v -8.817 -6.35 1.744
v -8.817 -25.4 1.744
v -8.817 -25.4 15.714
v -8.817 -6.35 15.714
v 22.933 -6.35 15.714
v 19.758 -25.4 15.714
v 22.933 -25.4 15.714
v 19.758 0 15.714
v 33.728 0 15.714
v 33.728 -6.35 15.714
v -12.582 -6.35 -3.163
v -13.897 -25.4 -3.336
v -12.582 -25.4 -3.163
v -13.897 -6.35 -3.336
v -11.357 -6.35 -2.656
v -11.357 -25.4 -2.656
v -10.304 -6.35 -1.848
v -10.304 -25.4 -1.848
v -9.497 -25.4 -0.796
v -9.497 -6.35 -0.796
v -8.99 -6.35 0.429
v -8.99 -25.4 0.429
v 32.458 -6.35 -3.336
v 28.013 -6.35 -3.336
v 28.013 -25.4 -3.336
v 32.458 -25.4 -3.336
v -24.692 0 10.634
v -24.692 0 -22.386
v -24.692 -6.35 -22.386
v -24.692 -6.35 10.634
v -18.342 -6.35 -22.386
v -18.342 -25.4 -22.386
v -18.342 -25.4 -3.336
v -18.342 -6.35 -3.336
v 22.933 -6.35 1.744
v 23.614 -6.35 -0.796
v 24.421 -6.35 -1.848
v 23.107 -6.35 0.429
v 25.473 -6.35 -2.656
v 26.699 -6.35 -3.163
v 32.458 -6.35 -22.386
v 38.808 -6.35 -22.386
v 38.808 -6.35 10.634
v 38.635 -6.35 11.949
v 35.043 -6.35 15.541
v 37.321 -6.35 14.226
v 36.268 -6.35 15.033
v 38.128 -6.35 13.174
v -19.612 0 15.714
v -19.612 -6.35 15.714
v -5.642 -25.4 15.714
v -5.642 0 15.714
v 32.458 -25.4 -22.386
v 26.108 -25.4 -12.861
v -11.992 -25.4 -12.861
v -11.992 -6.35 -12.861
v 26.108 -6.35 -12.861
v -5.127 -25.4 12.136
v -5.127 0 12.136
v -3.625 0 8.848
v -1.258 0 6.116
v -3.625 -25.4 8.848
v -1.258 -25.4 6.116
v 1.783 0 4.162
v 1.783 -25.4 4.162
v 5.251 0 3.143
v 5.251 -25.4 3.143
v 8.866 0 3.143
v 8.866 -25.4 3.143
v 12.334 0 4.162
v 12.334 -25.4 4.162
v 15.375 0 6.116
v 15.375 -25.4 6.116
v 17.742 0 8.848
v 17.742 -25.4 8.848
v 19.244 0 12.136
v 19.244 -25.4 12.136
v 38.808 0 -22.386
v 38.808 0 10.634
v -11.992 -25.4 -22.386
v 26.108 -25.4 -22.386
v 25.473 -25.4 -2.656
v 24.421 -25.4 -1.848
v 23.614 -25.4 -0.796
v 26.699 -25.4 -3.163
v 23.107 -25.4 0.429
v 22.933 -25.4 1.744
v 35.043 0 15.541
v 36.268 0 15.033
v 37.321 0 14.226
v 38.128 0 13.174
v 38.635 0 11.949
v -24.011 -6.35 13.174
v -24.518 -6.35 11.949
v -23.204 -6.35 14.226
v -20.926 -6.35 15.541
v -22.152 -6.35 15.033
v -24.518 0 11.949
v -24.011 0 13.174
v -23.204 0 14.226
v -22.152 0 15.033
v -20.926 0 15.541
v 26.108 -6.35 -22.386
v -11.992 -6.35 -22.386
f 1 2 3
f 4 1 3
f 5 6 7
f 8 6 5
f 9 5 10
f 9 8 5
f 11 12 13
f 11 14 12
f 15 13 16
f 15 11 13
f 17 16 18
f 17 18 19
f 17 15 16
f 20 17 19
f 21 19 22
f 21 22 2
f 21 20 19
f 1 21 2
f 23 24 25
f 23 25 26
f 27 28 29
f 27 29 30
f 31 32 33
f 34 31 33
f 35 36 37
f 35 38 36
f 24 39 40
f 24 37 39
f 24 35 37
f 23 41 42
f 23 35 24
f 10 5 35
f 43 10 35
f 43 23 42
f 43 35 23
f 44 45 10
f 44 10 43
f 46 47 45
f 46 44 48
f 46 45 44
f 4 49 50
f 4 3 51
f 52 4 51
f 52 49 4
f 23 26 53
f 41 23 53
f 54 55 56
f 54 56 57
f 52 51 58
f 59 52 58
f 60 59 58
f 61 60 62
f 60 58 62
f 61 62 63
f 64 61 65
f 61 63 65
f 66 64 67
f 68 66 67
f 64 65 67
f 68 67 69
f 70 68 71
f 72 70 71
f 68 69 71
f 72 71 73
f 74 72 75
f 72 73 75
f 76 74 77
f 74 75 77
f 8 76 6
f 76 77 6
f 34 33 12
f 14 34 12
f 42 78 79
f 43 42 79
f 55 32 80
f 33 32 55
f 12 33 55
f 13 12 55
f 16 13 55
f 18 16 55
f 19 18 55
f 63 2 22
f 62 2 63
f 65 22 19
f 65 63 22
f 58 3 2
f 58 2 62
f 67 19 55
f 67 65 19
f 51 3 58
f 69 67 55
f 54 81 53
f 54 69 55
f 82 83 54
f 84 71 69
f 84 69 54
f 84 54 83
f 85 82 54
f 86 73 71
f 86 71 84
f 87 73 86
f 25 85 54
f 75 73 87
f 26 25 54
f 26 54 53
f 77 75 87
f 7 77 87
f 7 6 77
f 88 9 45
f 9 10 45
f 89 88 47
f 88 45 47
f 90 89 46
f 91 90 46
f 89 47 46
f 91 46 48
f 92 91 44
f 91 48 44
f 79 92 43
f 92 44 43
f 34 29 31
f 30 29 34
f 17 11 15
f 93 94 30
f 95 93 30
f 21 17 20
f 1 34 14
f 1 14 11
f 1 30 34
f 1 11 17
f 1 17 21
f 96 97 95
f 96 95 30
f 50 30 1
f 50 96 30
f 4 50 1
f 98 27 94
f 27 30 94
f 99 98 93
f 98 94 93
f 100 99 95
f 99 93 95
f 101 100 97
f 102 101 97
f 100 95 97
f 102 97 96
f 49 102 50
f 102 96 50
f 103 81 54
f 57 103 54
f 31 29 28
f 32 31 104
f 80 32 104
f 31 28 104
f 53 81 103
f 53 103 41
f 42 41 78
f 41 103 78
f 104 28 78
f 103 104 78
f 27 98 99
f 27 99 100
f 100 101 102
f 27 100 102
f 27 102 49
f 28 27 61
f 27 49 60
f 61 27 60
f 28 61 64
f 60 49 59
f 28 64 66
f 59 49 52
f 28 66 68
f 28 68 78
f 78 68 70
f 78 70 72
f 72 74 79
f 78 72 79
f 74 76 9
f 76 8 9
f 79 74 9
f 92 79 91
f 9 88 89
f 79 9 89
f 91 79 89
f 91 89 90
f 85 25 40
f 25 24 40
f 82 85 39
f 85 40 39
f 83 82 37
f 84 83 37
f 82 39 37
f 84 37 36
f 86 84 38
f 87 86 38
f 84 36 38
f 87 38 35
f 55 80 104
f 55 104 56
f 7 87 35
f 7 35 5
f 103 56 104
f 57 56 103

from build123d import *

# Parameters (mm, degrees)
F0_W     = 63.5
F0_H     = 38.1
F1_DEPTH = 25.4
F2_R     = 12.7
F3_DEPTH = 25.4
F5_DEPTH = 19.05
F6_DEPTH = 19.05
F4_W     = 38.1
F4_H     = 9.525
F7_DEPTH = 19.05
F4_W_2   = 9.525
F4_H_2   = 19.05
F8_DEPTH = 19.05
F9_DEPTH = 19.05
F10_R    = 5.08


with BuildPart() as f1:
    # F0 (on Front) → F1 (new body)
    with BuildSketch(Plane.XZ):
        with Locations((7.05844, -3.336163)):
            Rectangle(F0_W, F0_H)
    extrude(amount=F1_DEPTH)

    # F2 (on face) → F3 (cut)
    with BuildSketch(Plane.XZ.offset(25.4)):
        with Locations((7.05844, 15.713837)):
            Circle(F2_R)
    extrude(amount=-F3_DEPTH, mode=Mode.SUBTRACT)

    # F4 (on face) → F5 (cut)
    with BuildSketch(Plane.XZ.offset(25.4)):
        Polygon((32.45844, -3.336163), (32.45844, -22.386163), (38.80844, -22.386163), (38.80844, 15.713837), (32.45844, 15.713837), align=None)
    extrude(amount=-F5_DEPTH, mode=Mode.SUBTRACT)

    # F4 (on face) → F6 (cut)
    with BuildSketch(Plane.XZ.offset(25.4)):
        Polygon((-18.34156, -3.336163), (-18.34156, 15.713837), (-24.69156, 15.713837), (-24.69156, -22.386163), (-18.34156, -22.386163), align=None)
    extrude(amount=-F6_DEPTH, mode=Mode.SUBTRACT)

    # F4 (on face) → F7 (cut)
    with BuildSketch(Plane.XZ.offset(25.4)):
        with Locations((7.05844, -17.623663)):
            Rectangle(F4_W, F4_H)
    extrude(amount=-F7_DEPTH, mode=Mode.SUBTRACT)

    # F4 (on face) → F8 (cut)
    with BuildSketch(Plane.XZ.offset(25.4)):
        with Locations((-13.57906, 6.188837)):
            Rectangle(F4_W_2, F4_H_2)
    extrude(amount=-F8_DEPTH, mode=Mode.SUBTRACT)

    # F4 (on face) → F9 (cut)
    with BuildSketch(Plane.XZ.offset(25.4)):
        with Locations((27.69594, 6.188837)):
            Rectangle(F4_W_2, F4_H_2)
    extrude(amount=-F9_DEPTH, mode=Mode.SUBTRACT)

    # F10
    f10_edges = [f1.edges().sort_by_distance(p)[0] for p in [
        (-24.69156, -3.175, 15.713837),
        (38.80844, -3.175, 15.713837),
        (22.93344, -15.875, -3.336163),
        (-8.81656, -15.875, -3.336163),
    ]]
    fillet(f10_edges, radius=F10_R)


solid = f1.part
